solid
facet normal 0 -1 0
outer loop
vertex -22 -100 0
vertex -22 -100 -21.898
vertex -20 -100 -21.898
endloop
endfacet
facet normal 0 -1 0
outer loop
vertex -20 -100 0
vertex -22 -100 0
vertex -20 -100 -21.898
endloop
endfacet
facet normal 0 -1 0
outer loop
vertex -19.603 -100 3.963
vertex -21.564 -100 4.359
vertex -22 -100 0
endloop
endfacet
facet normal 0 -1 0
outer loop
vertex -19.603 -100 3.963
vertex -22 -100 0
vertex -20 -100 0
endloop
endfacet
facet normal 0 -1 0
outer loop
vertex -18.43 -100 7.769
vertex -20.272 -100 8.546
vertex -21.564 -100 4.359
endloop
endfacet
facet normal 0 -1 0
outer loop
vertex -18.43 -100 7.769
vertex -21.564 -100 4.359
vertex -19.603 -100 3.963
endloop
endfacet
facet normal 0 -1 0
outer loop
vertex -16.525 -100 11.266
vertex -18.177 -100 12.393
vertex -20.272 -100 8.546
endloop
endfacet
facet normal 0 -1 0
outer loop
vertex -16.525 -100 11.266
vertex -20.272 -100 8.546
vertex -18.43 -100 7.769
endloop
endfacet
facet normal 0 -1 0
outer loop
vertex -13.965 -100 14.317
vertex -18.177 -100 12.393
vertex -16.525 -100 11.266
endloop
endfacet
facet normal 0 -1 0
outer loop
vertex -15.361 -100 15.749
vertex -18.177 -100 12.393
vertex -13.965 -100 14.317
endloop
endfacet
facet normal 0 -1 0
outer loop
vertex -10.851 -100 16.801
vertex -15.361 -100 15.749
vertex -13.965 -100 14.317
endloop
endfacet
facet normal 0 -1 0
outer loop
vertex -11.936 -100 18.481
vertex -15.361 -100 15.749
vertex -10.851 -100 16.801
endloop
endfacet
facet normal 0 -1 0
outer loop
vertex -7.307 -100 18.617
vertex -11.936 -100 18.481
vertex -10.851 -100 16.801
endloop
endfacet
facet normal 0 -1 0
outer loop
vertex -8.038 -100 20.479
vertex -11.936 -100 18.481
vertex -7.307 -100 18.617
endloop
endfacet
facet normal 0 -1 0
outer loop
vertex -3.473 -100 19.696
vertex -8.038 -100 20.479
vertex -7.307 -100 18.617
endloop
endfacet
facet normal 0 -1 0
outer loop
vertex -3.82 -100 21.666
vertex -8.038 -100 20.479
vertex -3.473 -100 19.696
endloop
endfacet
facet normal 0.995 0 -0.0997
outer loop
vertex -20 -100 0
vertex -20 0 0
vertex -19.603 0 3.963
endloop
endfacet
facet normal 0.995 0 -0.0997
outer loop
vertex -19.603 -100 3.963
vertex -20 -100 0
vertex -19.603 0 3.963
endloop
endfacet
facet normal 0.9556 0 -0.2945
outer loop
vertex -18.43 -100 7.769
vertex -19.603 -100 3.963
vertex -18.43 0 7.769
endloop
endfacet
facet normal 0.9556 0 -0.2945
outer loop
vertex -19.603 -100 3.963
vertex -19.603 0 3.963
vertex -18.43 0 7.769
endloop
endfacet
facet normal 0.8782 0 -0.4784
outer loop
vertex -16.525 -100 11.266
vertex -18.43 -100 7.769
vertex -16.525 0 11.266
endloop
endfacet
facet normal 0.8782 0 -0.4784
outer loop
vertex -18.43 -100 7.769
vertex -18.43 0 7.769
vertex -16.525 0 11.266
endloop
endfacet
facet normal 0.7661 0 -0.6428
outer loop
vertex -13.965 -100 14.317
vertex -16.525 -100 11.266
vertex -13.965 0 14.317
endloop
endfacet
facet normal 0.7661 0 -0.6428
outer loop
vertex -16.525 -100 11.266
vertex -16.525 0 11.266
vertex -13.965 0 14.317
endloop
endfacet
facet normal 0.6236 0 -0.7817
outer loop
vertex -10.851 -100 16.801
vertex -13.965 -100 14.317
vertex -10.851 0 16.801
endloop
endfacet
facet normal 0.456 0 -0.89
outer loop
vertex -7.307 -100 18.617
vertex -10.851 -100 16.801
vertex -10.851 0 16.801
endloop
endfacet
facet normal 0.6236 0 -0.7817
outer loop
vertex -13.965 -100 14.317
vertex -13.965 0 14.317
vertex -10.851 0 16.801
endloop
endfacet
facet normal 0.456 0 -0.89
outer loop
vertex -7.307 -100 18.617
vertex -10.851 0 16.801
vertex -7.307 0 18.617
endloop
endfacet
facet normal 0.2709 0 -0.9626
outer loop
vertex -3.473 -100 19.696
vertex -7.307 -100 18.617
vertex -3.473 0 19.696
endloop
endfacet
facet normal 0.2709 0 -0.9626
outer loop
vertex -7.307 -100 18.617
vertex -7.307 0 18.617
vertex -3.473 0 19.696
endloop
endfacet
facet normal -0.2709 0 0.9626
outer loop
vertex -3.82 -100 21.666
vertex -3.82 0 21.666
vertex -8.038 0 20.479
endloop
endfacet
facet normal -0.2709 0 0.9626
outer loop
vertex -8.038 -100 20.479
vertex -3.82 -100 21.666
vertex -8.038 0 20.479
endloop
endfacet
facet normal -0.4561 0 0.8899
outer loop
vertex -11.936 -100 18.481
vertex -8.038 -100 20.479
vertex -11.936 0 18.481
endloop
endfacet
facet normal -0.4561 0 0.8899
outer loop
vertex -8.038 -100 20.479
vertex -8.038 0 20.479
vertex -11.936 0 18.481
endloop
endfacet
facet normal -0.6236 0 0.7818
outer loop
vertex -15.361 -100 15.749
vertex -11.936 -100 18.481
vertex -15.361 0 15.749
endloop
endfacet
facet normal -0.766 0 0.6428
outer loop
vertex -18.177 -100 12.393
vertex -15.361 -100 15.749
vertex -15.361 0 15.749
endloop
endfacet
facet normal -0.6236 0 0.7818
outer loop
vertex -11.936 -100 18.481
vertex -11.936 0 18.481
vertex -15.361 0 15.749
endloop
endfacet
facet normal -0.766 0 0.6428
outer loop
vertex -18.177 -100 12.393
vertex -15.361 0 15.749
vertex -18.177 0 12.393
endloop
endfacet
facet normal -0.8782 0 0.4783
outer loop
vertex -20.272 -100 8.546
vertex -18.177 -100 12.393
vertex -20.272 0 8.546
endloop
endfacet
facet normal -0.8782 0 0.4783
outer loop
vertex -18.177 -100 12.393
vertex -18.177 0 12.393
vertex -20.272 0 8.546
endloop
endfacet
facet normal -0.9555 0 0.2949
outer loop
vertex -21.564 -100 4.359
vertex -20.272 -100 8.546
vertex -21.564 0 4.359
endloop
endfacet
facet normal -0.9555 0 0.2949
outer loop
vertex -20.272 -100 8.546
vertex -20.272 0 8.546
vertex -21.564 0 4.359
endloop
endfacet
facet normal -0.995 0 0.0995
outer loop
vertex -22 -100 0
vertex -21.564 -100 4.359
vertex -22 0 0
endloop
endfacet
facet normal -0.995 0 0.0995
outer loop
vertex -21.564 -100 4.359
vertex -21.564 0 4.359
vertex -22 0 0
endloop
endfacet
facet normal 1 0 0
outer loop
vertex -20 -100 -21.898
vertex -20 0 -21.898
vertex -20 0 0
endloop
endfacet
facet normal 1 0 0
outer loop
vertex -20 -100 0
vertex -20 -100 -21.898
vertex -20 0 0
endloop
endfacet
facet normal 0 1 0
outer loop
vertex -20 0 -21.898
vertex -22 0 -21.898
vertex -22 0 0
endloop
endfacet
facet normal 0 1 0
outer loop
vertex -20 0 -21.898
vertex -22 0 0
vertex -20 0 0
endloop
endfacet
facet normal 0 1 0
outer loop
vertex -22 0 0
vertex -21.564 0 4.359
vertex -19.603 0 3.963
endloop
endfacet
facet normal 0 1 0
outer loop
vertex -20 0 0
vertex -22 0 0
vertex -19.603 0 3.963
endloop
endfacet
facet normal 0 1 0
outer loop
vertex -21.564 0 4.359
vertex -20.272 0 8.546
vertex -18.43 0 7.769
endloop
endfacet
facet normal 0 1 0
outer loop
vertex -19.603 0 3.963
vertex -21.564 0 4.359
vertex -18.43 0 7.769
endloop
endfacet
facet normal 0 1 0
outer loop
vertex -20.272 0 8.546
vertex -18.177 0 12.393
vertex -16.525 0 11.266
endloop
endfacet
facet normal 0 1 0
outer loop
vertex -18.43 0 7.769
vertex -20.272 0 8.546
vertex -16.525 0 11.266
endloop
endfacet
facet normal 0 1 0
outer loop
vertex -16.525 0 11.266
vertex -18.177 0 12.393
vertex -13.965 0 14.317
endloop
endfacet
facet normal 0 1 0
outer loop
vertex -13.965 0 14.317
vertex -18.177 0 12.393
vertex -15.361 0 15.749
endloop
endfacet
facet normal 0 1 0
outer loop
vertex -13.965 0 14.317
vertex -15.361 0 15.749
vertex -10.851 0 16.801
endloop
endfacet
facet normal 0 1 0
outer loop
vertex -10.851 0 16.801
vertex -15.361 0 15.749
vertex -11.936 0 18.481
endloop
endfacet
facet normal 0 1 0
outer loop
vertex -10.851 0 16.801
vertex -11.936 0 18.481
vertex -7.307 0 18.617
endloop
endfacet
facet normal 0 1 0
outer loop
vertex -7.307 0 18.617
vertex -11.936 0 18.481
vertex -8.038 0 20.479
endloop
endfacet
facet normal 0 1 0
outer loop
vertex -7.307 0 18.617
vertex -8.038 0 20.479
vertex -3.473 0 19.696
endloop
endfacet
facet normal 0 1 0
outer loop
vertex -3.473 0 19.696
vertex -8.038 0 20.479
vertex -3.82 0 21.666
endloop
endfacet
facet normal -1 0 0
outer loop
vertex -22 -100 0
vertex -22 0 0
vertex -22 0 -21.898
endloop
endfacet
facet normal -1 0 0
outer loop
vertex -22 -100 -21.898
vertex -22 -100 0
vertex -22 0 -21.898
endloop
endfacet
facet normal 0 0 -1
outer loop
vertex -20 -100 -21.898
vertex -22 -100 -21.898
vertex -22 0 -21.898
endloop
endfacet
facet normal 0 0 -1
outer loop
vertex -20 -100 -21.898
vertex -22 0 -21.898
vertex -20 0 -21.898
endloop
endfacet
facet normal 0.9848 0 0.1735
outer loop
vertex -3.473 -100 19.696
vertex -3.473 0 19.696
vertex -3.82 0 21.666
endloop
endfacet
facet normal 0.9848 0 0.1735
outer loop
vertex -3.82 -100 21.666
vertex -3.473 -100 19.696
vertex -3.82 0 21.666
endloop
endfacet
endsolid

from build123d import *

# Parameters (mm, degrees)
F1_DEPTH = 100


with BuildPart() as f1:
    # F0 (on Front) → F1 (new body)
    with BuildSketch(Plane.XZ):
        with BuildLine():
            ThreePointArc((-20, 0), (-15.320889, 12.855752), (-3.472964, 19.696155))
            Line((-3.472964, 19.696155), (-3.82026, 21.665771))
            ThreePointArc((-3.82026, 21.665771), (-16.852978, 14.141327), (-22, 0))
            Line((-22, 0), (-22, -21.897534))
            Line((-22, -21.897534), (-20, -21.897534))
            Line((-20, -21.897534), (-20, 0))
        make_face()
    extrude(amount=F1_DEPTH)


solid = f1.part
